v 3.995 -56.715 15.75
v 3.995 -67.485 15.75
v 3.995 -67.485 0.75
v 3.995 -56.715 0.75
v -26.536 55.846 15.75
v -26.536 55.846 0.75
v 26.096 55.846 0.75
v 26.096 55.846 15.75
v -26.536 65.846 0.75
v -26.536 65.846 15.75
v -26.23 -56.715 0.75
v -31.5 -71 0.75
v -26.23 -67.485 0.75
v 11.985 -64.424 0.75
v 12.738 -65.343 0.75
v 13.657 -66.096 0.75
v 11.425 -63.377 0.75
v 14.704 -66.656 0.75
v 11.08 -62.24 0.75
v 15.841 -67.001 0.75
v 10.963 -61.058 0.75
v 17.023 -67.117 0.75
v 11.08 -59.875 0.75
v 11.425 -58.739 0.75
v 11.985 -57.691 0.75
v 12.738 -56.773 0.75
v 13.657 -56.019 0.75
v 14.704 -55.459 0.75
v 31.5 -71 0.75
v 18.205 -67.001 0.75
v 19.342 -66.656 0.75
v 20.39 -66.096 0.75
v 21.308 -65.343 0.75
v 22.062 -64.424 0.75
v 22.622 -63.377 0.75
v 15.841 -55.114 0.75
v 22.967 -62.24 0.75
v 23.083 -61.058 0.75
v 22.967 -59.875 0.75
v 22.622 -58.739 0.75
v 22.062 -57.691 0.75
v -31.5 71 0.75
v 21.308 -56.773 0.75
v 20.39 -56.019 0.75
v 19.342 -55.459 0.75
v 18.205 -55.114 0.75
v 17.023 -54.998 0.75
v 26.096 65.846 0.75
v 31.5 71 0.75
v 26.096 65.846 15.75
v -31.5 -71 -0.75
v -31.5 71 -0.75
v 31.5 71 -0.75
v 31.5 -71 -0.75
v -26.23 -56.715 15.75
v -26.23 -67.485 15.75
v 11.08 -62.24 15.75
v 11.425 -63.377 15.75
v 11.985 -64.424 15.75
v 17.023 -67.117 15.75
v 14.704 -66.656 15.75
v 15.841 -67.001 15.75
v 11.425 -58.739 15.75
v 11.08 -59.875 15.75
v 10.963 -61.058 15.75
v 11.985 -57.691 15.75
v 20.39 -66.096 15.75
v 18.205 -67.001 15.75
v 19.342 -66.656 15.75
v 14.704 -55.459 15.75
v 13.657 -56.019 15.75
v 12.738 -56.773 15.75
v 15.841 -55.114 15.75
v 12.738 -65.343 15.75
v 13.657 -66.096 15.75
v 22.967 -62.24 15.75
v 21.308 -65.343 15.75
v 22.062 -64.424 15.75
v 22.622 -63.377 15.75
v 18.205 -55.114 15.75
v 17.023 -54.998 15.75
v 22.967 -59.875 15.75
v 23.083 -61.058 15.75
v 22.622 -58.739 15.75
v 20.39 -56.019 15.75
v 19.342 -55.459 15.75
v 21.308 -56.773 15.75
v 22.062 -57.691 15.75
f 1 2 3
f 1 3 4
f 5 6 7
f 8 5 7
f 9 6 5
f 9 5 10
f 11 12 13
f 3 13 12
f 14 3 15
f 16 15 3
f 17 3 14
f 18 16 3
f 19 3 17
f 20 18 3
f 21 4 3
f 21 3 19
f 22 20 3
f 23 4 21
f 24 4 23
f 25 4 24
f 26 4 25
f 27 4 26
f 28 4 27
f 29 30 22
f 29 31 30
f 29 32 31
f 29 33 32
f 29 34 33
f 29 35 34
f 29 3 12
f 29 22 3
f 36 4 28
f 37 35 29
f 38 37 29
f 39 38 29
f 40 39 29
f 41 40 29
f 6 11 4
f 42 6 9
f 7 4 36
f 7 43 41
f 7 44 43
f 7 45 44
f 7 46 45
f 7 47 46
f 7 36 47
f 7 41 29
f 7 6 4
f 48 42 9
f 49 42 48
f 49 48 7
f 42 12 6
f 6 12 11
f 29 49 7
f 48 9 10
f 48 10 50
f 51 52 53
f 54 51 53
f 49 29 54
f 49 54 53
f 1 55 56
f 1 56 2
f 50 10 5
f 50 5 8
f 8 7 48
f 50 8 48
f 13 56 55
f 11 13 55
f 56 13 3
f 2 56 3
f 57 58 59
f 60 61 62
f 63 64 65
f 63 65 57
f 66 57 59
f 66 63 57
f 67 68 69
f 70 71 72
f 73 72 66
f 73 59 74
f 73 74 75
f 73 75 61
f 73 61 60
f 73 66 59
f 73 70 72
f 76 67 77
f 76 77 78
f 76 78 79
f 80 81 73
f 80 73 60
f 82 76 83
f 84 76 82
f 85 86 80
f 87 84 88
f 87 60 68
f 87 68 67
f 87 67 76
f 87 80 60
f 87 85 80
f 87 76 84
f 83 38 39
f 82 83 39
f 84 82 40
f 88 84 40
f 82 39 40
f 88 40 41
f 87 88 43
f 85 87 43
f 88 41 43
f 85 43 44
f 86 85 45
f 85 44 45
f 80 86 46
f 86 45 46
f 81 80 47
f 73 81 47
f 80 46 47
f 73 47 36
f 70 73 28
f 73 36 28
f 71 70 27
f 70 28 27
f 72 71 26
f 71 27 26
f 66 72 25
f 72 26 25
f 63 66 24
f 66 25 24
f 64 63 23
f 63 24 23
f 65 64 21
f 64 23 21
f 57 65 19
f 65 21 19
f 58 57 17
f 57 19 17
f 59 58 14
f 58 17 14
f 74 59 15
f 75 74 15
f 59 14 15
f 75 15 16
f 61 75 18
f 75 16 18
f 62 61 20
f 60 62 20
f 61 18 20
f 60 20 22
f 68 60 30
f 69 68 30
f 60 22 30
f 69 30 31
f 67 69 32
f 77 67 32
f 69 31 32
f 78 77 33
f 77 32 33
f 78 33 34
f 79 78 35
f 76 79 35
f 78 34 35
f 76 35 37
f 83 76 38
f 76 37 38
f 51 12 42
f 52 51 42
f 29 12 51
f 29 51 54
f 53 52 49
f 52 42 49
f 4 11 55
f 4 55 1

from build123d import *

# Parameters (mm, degrees)
SKETCH1_W           = 63
SKETCH1_H           = 142
BOSS_EXTRUDE1_DEPTH = 0.75
SKETCH2_W           = 52.632852527
SKETCH2_H           = 10
BOSS_EXTRUDE2_DEPTH = 15
SKETCH3_R           = 6.05981783
SKETCH3_W           = 30.224806401
SKETCH3_H           = 10.769758603
BOSS_EXTRUDE3_DEPTH = 15


with BuildPart() as part:
    # Sketch1 → Boss-Extrude1 (new, symmetric)
    with BuildSketch(Plane.XY):
        Rectangle(SKETCH1_W, SKETCH1_H)
    extrude(amount=BOSS_EXTRUDE1_DEPTH, both=True)

    # Sketch2 → Boss-Extrude2 (add)
    with BuildSketch(Plane.XY.offset(0.75)):
        with Locations((-0.219961356, 60.846409529)):
            Rectangle(SKETCH2_W, SKETCH2_H)
    extrude(amount=BOSS_EXTRUDE2_DEPTH)

    # Sketch3 → Boss-Extrude3 (add)
    with BuildSketch(Plane.XY.offset(0.75)):
        with Locations((17.023166824, -61.057583047)):
            Circle(SKETCH3_R)
        with Locations((-11.11717017, -62.099817751)):
            Rectangle(SKETCH3_W, SKETCH3_H)
    extrude(amount=BOSS_EXTRUDE3_DEPTH)


solid = part.part
